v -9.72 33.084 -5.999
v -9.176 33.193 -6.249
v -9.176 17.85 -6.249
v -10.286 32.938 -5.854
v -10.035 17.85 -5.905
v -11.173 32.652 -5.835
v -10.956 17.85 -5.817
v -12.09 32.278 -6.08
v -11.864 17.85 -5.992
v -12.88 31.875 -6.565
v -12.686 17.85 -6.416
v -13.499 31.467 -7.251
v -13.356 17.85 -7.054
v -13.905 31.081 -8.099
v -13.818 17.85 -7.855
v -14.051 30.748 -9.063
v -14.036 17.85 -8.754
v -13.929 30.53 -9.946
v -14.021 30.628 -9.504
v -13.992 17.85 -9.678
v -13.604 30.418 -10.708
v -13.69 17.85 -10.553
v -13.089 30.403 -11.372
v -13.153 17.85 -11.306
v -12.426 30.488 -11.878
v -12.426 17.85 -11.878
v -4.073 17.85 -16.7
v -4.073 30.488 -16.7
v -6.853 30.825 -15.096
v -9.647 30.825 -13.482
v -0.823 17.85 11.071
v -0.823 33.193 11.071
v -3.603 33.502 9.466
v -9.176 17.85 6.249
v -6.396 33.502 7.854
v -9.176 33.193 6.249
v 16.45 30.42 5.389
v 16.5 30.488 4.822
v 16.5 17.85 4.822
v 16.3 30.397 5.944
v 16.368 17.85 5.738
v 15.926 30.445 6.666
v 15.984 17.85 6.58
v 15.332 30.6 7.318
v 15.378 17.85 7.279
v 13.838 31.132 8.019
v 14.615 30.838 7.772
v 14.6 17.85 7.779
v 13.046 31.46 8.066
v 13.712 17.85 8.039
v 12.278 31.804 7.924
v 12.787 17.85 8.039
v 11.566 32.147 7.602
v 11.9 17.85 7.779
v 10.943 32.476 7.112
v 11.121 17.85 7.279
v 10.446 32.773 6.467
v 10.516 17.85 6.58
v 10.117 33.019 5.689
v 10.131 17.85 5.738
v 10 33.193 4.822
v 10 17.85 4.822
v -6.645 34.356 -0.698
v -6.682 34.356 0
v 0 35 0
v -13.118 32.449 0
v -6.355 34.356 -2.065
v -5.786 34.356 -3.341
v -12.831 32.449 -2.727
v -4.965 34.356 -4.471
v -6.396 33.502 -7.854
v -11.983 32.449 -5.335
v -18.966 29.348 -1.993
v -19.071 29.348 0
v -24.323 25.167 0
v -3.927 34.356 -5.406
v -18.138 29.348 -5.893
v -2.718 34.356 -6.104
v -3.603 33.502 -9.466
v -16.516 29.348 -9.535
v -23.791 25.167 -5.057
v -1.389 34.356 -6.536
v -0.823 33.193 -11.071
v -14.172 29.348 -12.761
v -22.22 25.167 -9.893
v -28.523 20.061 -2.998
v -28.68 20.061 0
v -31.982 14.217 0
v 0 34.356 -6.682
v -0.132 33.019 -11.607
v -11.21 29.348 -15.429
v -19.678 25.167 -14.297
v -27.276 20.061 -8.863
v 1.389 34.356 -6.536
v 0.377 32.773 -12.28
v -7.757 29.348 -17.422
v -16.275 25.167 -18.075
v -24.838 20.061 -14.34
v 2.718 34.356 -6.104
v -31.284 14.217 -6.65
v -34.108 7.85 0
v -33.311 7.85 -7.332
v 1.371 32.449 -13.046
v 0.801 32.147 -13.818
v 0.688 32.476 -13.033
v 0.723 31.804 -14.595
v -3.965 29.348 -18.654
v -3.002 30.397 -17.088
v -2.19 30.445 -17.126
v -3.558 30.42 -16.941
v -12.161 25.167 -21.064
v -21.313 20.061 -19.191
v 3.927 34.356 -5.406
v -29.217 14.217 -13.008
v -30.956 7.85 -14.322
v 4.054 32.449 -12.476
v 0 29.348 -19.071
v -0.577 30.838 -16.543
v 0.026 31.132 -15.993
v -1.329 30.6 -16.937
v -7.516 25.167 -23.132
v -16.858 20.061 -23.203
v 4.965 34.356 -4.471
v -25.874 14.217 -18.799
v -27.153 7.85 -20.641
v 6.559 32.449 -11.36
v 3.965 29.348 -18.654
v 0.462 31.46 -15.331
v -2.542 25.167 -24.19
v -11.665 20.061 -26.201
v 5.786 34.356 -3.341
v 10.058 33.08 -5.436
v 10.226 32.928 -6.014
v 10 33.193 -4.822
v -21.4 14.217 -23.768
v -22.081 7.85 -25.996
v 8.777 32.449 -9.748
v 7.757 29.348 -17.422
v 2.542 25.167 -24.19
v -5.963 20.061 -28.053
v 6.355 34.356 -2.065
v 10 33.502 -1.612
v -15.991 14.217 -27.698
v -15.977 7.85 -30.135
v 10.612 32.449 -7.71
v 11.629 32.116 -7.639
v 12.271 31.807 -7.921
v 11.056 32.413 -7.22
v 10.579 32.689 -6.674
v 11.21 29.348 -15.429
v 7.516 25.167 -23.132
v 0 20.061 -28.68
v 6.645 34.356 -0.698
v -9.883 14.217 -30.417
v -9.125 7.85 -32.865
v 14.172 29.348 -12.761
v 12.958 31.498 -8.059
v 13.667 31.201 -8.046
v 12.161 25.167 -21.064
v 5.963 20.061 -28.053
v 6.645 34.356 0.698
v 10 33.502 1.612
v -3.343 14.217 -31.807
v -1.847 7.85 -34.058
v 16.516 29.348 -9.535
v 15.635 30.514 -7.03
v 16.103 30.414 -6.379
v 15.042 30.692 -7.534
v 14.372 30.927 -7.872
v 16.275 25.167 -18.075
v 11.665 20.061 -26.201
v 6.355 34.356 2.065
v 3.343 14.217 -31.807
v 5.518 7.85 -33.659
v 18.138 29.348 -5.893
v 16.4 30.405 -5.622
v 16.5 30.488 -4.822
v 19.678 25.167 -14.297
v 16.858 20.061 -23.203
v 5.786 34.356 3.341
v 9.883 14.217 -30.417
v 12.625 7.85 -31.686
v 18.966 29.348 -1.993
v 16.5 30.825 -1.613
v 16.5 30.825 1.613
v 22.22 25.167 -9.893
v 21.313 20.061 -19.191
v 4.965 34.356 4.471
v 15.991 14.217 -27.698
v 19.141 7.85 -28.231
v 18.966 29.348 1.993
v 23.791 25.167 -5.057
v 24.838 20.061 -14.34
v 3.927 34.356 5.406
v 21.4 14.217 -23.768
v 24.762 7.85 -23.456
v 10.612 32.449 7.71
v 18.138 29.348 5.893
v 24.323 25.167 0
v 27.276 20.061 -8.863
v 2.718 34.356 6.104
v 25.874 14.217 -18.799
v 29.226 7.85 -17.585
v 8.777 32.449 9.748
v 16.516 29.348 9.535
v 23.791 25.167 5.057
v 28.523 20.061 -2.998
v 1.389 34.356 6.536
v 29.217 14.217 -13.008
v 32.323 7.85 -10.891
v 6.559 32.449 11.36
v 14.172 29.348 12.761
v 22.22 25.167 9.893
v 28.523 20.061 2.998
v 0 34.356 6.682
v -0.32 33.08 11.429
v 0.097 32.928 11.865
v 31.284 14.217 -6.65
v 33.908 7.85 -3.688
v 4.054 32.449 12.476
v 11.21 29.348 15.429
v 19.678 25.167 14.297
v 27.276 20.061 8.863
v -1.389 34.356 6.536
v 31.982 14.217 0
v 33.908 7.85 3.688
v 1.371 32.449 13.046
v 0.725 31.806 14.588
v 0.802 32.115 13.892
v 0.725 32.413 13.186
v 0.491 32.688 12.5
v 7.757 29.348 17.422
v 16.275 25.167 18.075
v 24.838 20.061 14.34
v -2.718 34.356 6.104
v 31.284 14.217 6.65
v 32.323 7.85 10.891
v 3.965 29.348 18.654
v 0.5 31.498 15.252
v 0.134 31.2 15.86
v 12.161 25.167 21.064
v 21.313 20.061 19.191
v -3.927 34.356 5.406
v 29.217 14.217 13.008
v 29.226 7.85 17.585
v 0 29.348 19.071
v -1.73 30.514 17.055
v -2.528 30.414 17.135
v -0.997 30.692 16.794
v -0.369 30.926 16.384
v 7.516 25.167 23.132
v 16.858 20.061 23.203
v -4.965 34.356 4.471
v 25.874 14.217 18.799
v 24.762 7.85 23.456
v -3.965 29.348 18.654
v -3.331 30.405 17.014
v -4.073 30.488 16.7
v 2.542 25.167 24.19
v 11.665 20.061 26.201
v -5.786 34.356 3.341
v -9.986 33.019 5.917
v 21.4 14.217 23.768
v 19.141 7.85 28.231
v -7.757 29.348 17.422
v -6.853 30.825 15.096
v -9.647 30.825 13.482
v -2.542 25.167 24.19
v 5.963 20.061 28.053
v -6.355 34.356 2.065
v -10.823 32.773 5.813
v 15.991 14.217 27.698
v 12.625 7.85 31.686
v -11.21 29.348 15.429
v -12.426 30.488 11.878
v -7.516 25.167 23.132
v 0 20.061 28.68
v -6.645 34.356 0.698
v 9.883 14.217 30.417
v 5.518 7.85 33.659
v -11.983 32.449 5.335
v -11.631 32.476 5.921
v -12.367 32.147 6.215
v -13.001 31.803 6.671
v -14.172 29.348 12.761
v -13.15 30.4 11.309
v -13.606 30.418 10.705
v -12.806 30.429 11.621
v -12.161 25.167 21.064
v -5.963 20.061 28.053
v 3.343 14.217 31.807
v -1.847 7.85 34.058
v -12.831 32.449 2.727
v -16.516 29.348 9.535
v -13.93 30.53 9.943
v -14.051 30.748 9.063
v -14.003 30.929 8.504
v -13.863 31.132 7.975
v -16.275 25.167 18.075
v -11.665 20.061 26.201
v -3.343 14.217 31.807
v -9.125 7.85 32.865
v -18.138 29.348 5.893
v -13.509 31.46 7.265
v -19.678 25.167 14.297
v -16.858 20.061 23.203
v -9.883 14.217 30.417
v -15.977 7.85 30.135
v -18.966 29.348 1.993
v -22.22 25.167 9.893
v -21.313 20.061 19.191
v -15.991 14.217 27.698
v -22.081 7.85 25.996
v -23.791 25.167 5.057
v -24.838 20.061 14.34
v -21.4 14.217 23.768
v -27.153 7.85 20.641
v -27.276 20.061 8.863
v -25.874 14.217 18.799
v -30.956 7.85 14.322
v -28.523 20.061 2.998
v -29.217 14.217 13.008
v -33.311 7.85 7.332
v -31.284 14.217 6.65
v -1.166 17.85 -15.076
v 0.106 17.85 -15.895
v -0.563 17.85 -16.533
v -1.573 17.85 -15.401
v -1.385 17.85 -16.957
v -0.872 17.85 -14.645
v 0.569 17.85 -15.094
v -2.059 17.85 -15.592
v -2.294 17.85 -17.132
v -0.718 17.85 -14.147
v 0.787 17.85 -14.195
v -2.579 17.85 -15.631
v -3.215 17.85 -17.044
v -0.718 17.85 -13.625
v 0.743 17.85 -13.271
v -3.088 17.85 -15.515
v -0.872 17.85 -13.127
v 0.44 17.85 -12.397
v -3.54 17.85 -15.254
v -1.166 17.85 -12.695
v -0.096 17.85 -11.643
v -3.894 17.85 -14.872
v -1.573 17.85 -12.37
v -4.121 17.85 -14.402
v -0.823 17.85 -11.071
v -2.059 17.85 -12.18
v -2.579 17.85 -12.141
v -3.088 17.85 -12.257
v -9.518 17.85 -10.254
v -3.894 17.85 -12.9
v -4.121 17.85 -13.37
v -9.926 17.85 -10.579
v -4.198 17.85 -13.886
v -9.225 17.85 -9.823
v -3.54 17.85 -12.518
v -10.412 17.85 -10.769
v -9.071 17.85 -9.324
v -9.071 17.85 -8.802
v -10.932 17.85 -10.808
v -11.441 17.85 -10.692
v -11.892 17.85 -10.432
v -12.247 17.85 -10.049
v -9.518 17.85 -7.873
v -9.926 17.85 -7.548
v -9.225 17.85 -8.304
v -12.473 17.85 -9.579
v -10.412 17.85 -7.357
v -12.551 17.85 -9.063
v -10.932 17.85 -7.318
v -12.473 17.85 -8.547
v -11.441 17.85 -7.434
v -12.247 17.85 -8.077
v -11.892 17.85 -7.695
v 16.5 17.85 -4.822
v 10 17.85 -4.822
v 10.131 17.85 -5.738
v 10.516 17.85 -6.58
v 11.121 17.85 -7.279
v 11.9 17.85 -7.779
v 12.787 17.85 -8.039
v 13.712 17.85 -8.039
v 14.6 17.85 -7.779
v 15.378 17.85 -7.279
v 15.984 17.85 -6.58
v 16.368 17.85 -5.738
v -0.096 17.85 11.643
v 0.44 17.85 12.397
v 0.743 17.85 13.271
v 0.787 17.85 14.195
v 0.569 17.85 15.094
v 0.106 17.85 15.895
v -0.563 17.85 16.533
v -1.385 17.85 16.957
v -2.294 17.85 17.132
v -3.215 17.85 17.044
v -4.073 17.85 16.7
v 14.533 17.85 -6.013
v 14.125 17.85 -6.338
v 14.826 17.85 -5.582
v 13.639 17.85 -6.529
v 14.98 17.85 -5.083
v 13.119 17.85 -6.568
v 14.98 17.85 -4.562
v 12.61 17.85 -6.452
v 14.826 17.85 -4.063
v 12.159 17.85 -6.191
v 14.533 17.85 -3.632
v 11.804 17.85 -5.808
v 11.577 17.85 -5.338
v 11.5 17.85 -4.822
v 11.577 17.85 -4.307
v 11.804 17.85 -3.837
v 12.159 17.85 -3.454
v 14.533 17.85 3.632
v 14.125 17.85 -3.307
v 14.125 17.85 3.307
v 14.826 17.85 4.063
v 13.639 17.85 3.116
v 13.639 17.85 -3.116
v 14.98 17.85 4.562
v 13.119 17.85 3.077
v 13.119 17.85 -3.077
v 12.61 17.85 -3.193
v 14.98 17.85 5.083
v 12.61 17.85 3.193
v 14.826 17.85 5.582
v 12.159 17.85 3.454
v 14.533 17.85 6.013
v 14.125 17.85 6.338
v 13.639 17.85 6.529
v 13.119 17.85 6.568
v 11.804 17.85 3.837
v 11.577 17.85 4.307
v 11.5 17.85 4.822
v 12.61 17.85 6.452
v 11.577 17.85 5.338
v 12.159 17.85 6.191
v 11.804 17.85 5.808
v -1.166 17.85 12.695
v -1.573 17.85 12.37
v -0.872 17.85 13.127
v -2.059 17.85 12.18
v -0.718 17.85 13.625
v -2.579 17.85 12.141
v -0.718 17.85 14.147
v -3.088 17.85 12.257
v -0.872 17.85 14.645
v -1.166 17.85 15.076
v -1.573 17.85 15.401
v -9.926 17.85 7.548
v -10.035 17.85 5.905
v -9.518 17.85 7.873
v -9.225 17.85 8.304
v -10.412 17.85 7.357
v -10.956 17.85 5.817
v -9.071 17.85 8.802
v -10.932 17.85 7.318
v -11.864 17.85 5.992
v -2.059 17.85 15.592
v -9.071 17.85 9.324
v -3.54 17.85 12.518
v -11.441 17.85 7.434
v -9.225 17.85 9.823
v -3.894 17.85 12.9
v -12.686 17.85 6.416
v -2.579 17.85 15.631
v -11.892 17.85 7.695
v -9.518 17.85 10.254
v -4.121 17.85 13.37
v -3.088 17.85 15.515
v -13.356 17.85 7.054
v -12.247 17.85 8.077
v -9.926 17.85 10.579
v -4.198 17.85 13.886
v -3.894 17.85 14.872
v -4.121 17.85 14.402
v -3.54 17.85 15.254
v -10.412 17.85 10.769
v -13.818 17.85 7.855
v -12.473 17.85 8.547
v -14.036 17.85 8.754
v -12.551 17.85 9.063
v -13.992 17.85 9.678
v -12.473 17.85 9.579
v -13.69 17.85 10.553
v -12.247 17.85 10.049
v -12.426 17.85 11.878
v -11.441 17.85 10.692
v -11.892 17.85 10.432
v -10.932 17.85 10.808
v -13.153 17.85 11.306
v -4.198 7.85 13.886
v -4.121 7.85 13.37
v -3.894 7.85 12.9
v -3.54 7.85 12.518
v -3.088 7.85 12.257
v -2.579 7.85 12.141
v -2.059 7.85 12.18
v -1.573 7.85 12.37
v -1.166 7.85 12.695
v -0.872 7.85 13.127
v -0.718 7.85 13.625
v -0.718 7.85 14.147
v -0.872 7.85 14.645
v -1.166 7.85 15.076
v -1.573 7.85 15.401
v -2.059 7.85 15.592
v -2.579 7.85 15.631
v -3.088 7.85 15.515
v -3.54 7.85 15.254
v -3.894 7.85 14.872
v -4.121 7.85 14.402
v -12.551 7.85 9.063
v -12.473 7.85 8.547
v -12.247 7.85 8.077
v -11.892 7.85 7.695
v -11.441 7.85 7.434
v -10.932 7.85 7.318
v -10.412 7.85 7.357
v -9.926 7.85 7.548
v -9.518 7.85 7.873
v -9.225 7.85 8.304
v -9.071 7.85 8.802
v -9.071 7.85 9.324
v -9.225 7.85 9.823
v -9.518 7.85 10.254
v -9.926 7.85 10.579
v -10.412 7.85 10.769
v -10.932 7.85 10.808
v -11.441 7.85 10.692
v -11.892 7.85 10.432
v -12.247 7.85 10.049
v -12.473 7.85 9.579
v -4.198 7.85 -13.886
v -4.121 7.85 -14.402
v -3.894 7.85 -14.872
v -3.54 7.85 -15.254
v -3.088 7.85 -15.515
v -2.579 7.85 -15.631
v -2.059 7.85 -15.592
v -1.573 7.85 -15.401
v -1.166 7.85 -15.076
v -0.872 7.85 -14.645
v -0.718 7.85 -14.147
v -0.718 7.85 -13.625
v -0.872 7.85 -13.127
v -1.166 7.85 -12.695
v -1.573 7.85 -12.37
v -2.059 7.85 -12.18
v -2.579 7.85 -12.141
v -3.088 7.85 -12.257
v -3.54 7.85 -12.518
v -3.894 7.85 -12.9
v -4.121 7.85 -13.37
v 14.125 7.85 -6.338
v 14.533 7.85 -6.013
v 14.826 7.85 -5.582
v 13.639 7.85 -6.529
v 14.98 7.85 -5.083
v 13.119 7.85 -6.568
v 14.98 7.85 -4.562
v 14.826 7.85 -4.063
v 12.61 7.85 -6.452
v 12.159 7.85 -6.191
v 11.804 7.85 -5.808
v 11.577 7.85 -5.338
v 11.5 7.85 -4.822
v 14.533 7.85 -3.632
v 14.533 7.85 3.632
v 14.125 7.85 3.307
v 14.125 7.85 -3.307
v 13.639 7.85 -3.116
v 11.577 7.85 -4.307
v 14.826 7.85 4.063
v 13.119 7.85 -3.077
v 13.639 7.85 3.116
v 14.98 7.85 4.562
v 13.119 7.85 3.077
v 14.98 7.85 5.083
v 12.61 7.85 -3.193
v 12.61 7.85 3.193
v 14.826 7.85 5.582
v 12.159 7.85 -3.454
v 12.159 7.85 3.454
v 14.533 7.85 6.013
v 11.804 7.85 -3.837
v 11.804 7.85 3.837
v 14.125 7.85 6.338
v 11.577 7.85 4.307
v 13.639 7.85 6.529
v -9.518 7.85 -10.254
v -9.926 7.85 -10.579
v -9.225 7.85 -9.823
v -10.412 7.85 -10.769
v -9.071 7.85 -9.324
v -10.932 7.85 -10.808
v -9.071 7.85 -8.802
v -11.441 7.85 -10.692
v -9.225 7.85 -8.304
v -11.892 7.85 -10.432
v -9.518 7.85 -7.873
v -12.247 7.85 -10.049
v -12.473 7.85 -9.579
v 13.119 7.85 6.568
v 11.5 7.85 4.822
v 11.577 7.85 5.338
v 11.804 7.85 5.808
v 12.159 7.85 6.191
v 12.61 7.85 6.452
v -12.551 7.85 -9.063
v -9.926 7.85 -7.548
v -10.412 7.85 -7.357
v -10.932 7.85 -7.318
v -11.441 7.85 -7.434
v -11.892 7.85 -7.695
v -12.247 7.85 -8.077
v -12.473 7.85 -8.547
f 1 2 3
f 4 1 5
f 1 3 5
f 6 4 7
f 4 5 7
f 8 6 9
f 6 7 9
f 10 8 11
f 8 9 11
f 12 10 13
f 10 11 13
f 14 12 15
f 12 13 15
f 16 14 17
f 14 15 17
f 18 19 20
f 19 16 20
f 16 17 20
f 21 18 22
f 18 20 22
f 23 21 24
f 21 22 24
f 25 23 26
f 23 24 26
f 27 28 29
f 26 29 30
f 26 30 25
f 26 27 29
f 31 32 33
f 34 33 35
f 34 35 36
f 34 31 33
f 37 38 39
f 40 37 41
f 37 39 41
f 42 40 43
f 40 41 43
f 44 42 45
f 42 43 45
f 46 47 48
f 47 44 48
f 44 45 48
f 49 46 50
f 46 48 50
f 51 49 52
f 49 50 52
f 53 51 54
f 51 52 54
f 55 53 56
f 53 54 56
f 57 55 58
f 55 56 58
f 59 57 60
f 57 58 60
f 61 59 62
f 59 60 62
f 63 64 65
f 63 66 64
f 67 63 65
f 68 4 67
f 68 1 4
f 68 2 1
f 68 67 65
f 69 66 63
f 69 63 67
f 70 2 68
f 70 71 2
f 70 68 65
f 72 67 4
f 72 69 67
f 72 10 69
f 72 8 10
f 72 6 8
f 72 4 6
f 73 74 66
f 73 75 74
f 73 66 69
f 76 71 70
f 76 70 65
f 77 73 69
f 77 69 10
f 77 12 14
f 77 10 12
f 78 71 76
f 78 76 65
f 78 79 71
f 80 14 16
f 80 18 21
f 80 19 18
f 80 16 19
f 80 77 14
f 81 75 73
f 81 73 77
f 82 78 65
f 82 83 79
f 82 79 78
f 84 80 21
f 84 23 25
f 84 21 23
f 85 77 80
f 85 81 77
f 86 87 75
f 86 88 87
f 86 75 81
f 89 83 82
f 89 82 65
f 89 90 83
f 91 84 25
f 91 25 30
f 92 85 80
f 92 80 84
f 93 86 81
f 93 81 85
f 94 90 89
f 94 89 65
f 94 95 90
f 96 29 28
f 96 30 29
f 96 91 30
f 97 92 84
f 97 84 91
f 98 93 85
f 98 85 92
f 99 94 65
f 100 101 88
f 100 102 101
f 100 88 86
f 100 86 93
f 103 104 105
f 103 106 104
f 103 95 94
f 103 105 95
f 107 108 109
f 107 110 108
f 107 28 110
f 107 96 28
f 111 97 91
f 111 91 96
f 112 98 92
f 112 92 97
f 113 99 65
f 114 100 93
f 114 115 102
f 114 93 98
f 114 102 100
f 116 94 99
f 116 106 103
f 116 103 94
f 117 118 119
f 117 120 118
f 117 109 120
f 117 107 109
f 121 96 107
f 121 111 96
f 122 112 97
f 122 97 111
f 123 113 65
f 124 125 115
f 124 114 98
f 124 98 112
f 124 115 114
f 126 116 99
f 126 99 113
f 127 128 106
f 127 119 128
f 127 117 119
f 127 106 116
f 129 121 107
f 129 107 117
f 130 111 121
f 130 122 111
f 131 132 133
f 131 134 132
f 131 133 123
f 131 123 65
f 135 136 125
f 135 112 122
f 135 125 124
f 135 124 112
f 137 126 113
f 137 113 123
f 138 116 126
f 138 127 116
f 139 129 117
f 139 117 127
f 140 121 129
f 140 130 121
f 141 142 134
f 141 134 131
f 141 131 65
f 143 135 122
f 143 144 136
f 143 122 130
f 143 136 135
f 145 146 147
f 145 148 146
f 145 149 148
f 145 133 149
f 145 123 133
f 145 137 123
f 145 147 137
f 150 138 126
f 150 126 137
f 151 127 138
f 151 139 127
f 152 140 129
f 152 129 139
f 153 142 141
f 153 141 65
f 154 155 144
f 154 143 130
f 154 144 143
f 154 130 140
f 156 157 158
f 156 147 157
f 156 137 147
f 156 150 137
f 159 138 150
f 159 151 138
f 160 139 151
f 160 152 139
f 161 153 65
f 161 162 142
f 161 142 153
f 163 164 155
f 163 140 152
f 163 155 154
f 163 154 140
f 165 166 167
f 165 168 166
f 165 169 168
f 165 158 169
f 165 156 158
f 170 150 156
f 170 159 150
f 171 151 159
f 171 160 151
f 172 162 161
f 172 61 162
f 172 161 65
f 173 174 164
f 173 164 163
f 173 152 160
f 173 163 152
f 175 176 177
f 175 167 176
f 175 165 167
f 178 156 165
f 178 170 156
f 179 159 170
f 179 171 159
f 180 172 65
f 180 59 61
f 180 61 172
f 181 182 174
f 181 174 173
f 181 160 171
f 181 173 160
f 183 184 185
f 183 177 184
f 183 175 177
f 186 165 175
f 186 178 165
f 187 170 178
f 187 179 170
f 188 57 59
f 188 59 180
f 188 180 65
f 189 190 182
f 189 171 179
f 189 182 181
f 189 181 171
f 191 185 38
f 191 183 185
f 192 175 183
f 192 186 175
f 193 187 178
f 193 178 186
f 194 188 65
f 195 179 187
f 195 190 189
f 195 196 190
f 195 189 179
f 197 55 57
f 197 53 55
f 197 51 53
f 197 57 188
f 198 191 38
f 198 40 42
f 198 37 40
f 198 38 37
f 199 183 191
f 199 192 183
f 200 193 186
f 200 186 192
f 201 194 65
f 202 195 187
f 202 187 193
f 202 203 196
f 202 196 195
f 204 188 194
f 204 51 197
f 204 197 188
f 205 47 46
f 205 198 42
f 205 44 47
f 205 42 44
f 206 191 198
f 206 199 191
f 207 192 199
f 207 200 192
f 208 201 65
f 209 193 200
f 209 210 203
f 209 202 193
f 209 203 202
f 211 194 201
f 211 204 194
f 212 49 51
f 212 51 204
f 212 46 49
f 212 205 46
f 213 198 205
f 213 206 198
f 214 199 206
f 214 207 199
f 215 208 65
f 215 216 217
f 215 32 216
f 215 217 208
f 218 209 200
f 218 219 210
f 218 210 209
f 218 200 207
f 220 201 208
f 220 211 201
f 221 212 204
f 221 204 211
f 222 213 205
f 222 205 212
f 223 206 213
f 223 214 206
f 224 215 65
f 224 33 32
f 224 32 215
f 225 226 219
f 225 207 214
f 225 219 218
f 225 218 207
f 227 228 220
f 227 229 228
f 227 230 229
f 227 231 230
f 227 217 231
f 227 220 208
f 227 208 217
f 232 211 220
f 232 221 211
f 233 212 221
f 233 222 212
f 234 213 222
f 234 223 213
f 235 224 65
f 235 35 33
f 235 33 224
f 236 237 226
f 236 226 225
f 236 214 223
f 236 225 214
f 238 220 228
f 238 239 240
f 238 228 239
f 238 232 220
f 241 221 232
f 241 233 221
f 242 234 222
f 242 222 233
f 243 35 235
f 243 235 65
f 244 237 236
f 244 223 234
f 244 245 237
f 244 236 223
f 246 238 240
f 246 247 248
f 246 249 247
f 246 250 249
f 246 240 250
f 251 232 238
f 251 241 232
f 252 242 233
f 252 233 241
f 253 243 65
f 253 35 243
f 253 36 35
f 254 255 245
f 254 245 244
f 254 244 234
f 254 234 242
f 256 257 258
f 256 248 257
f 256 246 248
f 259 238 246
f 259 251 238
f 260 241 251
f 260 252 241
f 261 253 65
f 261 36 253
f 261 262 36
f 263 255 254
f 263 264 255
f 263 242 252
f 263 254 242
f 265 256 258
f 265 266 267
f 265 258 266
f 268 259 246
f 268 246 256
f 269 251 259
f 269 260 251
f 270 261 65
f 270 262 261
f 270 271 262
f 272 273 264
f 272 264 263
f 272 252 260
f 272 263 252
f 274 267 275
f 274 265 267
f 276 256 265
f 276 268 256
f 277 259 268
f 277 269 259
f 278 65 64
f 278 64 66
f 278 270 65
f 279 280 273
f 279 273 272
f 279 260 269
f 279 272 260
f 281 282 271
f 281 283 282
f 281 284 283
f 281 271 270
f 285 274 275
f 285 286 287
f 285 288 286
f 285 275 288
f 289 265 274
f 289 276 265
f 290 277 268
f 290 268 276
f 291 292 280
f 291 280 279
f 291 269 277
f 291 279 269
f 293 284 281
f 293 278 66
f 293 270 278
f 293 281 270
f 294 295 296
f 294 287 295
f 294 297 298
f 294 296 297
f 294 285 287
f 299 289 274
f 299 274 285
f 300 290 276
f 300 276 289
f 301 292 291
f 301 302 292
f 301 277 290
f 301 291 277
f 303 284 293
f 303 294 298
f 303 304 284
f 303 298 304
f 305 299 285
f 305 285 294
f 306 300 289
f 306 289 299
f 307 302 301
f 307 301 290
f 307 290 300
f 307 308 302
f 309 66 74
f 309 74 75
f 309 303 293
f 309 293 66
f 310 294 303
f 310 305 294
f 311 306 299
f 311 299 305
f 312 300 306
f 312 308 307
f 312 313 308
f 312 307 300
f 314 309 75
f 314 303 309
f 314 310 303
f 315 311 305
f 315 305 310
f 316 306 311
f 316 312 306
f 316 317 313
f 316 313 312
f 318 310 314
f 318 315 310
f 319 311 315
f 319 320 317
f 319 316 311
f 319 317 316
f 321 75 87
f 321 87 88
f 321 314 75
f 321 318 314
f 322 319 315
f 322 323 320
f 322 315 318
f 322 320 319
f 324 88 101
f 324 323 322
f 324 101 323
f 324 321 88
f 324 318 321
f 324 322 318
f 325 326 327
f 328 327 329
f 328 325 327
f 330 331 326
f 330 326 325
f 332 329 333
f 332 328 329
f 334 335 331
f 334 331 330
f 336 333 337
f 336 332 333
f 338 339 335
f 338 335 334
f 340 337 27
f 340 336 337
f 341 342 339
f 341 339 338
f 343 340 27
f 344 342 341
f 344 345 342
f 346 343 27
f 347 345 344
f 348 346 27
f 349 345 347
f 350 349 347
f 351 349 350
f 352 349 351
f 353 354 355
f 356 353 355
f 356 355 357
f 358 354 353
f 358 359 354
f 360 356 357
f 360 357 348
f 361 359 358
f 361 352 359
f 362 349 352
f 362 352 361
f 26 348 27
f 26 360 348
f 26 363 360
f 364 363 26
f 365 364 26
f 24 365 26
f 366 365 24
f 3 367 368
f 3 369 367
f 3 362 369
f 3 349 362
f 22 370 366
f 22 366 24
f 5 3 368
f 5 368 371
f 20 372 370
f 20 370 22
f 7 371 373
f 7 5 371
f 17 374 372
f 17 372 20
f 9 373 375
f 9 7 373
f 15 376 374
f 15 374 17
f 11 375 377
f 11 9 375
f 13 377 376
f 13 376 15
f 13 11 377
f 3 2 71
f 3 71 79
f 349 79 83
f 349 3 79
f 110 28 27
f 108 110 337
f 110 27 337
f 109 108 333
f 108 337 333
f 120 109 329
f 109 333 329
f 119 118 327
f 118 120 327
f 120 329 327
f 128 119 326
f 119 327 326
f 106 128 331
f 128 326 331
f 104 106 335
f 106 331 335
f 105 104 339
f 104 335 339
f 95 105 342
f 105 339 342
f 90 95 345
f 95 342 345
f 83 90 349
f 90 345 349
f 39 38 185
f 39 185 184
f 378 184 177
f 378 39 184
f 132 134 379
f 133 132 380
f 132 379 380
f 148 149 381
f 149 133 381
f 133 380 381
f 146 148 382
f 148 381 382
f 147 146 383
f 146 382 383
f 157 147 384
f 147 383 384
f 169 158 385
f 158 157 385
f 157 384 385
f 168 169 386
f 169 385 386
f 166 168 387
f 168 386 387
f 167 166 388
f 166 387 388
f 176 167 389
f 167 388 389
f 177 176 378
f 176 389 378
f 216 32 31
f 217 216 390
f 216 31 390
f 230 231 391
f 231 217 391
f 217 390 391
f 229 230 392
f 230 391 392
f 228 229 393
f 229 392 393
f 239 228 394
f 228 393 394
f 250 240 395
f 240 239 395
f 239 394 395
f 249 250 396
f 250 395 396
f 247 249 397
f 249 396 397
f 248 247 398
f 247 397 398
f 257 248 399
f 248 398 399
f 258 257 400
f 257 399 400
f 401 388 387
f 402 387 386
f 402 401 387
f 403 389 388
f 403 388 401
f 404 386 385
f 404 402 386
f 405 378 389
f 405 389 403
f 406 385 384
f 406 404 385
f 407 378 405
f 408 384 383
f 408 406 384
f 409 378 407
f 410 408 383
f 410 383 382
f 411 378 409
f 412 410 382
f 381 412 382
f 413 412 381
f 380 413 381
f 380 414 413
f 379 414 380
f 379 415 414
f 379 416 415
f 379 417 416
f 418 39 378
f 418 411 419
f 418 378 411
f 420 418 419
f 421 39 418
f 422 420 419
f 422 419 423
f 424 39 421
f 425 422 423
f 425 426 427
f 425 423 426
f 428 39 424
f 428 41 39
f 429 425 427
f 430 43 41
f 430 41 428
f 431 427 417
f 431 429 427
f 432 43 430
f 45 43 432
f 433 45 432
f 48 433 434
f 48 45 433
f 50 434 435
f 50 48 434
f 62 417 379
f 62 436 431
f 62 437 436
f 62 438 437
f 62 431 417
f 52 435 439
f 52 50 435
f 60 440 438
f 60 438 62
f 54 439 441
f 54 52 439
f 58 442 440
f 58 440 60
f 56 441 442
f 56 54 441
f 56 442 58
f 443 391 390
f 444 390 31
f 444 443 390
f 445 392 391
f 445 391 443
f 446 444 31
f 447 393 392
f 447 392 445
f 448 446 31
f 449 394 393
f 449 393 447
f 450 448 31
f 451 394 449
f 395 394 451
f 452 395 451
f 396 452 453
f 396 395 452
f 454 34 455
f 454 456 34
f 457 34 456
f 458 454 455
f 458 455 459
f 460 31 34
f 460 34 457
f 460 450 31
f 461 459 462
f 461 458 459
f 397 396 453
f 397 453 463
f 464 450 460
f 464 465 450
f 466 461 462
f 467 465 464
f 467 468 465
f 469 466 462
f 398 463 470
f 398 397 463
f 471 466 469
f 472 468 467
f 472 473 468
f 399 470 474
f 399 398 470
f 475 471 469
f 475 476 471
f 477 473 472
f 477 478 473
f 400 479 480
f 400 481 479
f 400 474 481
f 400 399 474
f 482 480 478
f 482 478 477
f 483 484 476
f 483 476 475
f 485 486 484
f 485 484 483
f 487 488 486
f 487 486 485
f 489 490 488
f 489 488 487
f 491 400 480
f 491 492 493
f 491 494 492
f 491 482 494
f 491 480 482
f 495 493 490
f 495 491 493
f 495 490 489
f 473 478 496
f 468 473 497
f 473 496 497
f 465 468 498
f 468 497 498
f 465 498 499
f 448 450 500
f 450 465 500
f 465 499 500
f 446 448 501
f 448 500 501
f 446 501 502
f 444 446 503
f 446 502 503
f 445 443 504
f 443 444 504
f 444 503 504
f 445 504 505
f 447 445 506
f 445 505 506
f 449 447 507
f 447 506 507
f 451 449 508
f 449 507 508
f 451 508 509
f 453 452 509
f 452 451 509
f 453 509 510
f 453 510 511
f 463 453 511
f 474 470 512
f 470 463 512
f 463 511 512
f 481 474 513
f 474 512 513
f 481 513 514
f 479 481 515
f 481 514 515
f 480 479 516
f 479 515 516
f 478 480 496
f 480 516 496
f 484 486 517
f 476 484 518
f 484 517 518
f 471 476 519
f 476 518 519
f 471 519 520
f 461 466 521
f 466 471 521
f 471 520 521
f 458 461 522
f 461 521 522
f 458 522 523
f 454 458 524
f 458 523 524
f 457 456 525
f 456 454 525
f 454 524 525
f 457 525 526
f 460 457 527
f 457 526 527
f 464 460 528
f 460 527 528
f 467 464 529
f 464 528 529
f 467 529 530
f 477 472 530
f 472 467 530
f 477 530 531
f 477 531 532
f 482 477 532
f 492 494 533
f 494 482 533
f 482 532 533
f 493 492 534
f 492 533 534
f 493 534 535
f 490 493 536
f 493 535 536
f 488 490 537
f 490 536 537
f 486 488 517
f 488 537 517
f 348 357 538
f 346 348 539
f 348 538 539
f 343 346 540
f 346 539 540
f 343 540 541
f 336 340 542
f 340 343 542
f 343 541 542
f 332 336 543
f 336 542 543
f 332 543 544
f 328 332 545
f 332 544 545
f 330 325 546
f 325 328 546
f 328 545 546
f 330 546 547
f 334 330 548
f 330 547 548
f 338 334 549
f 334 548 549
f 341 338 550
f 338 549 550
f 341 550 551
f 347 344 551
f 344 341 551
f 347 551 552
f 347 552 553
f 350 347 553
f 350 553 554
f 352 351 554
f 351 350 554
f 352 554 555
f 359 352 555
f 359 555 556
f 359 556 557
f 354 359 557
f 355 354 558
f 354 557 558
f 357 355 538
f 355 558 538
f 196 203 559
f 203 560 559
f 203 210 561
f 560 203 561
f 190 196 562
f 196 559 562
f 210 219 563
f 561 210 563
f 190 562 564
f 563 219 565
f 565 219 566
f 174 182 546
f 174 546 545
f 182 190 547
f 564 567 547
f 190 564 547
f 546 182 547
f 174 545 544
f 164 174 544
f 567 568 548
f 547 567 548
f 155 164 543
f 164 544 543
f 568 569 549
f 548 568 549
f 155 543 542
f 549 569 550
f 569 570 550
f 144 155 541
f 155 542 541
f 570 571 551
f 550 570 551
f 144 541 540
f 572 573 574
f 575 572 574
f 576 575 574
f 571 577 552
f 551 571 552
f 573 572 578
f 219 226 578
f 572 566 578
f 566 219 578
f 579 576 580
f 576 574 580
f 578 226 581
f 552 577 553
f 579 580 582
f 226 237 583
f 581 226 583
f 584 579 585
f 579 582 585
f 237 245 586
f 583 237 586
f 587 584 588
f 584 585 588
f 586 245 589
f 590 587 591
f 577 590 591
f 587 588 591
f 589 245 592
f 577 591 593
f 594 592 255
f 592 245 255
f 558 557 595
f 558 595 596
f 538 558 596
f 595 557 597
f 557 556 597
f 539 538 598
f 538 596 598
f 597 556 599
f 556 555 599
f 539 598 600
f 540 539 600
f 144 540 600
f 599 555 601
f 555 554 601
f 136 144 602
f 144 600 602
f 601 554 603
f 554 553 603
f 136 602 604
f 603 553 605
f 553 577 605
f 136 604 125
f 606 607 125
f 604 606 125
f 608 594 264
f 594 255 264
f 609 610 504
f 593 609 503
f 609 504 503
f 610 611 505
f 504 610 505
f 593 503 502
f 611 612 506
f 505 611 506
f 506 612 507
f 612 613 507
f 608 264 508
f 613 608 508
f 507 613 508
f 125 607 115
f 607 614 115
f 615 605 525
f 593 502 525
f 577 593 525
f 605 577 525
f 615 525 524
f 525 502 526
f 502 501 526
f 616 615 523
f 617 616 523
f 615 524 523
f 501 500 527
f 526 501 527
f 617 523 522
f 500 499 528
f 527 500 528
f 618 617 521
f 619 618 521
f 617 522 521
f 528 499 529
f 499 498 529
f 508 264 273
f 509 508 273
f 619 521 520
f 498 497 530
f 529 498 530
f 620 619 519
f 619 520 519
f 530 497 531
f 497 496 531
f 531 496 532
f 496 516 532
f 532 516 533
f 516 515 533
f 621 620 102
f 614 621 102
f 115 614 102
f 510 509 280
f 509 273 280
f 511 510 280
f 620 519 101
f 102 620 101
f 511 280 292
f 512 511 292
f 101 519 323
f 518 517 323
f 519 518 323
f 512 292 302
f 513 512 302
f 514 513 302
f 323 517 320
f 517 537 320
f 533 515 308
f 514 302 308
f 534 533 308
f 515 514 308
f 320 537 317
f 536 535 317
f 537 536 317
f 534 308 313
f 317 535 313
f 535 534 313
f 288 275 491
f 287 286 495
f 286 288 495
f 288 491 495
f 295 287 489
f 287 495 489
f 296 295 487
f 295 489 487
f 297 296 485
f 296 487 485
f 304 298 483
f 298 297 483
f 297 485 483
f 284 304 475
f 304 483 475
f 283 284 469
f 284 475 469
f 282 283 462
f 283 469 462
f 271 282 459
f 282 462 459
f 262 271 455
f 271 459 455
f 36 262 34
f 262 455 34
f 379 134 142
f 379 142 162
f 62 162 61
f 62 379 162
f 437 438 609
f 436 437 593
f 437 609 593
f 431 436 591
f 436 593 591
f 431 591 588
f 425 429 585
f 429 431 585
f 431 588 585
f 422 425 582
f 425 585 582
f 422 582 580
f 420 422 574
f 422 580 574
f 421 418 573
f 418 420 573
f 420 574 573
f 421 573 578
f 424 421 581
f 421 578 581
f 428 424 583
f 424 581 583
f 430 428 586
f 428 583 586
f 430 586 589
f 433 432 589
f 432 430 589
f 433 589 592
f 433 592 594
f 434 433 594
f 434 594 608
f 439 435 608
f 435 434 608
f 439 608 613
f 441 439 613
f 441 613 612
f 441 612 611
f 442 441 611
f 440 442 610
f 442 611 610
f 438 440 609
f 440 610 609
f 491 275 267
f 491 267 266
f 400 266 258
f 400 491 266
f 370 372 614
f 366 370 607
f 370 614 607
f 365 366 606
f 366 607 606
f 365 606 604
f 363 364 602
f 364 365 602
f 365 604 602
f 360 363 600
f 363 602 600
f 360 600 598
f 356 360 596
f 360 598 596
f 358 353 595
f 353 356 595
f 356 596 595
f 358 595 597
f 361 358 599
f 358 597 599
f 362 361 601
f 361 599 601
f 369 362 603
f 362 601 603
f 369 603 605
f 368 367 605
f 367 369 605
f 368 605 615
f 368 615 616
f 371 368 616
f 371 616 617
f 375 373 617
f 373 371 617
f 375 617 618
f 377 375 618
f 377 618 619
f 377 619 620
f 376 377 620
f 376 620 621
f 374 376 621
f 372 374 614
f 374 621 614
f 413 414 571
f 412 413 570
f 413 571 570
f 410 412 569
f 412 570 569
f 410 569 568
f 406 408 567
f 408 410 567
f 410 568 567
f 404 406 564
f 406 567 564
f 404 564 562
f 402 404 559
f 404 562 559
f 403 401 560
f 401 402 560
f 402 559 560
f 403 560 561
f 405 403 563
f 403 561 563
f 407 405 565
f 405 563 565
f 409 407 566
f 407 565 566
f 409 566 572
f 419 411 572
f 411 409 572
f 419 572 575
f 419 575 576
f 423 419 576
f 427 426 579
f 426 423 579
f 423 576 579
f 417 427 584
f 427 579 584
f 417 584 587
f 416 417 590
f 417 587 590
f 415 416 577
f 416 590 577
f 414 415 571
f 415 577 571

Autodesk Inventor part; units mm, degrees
ref_plane "YZ Plane" through (0, 0, 0) normal (1, 0, 0) x (0, 1, 0)
ref_plane "XZ Plane" through (0, 0, 0) normal (0, 1, 0) x (-1, 0, 0)
ref_plane "XY Plane" through (0, 0, 0) normal (0, 0, 1) x (1, 0, 0)
sketch "Szkic1" plane through (0, 0, 0) normal (0, 1, 0) x (-1, 0, 0)
  circle A0 centre (0, 0) radius 14.1 construction
  line L0 (0, 0) -> (-14.1, 0) construction
  circle A1 centre (0, 0) radius 22.5 construction
  circle A2 centre (-13.2497, 4.8225) radius 1.75
  circle A3 centre (-13.2497, -4.8225) radius 1.75
  circle A4 centre (2.4484, 13.8858) radius 1.75
  circle A5 centre (10.8012, 9.0633) radius 1.75
  circle A6 centre (10.8012, -9.0633) radius 1.75
  circle A7 centre (2.4484, -13.8858) radius 1.75
  circle A8 centre (0, 0) radius 35
  circle A9 centre (-13.2497, 4.8225) radius 3.25
  circle A10 centre (-13.2497, -4.8225) radius 3.25
  circle A11 centre (2.4484, -13.8858) radius 3.25
  circle A12 centre (10.8012, -9.0633) radius 3.25
  circle A13 centre (10.8012, 9.0633) radius 3.25
  circle A14 centre (2.4484, 13.8858) radius 3.25
  line L1 (-9.9997, -4.8225) -> (-9.9997, 4.8225)
  line L2 (-16.4997, 4.8225) -> (-16.4997, -4.8225)
  line L3 (4.0734, -16.7004) -> (12.4262, -11.8779)
  line L4 (9.1762, -6.2487) -> (0.8234, -11.0712)
  line L5 (12.4262, 11.8779) -> (4.0734, 16.7004)
  line L6 (0.8234, 11.0712) -> (9.1762, 6.2487)
  dimension "d0" = 28.2
  dimension "d1" = 3.5
  dimension "d2" = 40
  dimension "d5" = 360
  dimension "d7" = 45
  dimension "d8" = 70
  dimension "d12" = 6.5
  dimension "d15" = 360
  dimension "d29" = 360
sketch "Szkic3" plane through (0, 0, 0) normal (0, 0, 1) x (1, 0, 0)
  arc A0 (0, 35) -> (-35, 0) centre (0, 0) ccw
  line L0 (0, 35) -> (0, 0)
  line L1 (0, 0) -> (-35, 0)
  line L2 (0, -8.4497) -> (0, 50.6985) projected
  dimension "d19" = 35
revolve "Obrót1" add sketch "Szkic3" angle 360 about axis through (0, -10, 0) along (0, 1, 0)
extrude "Wyciągnięcie proste1" cut sketch "Szkic1" along normal through all contours A2 | A3 | A4 | A5 | A6 | A7 | A9 | L1 A10 L2 A9 | A10 | A11 | A11 L4 A12 L3 | A12 | A13 | A13 L6 A14 L5 | A14
extrude "Wyciągnięcie proste2" add sketch "Szkic1" along normal blind 17.85 contours A9 | L1 A10 L2 A9 | A10 | A11 | A11 L4 A12 L3 | A12 | A13 | A13 L6 A14 L5 | A14
extrude "Wyciągnięcie proste3" cut sketch "Szkic1" along normal blind 7.85 contours A2 | A3 | A4 | A5 | A6 | A7 | A8 | A9 | L1 A10 L2 A9 | A10 | A11 | A11 L4 A12 L3 | A12 | A13 | A13 L6 A14 L5 | A14
properties part number "hemisphere_2"
